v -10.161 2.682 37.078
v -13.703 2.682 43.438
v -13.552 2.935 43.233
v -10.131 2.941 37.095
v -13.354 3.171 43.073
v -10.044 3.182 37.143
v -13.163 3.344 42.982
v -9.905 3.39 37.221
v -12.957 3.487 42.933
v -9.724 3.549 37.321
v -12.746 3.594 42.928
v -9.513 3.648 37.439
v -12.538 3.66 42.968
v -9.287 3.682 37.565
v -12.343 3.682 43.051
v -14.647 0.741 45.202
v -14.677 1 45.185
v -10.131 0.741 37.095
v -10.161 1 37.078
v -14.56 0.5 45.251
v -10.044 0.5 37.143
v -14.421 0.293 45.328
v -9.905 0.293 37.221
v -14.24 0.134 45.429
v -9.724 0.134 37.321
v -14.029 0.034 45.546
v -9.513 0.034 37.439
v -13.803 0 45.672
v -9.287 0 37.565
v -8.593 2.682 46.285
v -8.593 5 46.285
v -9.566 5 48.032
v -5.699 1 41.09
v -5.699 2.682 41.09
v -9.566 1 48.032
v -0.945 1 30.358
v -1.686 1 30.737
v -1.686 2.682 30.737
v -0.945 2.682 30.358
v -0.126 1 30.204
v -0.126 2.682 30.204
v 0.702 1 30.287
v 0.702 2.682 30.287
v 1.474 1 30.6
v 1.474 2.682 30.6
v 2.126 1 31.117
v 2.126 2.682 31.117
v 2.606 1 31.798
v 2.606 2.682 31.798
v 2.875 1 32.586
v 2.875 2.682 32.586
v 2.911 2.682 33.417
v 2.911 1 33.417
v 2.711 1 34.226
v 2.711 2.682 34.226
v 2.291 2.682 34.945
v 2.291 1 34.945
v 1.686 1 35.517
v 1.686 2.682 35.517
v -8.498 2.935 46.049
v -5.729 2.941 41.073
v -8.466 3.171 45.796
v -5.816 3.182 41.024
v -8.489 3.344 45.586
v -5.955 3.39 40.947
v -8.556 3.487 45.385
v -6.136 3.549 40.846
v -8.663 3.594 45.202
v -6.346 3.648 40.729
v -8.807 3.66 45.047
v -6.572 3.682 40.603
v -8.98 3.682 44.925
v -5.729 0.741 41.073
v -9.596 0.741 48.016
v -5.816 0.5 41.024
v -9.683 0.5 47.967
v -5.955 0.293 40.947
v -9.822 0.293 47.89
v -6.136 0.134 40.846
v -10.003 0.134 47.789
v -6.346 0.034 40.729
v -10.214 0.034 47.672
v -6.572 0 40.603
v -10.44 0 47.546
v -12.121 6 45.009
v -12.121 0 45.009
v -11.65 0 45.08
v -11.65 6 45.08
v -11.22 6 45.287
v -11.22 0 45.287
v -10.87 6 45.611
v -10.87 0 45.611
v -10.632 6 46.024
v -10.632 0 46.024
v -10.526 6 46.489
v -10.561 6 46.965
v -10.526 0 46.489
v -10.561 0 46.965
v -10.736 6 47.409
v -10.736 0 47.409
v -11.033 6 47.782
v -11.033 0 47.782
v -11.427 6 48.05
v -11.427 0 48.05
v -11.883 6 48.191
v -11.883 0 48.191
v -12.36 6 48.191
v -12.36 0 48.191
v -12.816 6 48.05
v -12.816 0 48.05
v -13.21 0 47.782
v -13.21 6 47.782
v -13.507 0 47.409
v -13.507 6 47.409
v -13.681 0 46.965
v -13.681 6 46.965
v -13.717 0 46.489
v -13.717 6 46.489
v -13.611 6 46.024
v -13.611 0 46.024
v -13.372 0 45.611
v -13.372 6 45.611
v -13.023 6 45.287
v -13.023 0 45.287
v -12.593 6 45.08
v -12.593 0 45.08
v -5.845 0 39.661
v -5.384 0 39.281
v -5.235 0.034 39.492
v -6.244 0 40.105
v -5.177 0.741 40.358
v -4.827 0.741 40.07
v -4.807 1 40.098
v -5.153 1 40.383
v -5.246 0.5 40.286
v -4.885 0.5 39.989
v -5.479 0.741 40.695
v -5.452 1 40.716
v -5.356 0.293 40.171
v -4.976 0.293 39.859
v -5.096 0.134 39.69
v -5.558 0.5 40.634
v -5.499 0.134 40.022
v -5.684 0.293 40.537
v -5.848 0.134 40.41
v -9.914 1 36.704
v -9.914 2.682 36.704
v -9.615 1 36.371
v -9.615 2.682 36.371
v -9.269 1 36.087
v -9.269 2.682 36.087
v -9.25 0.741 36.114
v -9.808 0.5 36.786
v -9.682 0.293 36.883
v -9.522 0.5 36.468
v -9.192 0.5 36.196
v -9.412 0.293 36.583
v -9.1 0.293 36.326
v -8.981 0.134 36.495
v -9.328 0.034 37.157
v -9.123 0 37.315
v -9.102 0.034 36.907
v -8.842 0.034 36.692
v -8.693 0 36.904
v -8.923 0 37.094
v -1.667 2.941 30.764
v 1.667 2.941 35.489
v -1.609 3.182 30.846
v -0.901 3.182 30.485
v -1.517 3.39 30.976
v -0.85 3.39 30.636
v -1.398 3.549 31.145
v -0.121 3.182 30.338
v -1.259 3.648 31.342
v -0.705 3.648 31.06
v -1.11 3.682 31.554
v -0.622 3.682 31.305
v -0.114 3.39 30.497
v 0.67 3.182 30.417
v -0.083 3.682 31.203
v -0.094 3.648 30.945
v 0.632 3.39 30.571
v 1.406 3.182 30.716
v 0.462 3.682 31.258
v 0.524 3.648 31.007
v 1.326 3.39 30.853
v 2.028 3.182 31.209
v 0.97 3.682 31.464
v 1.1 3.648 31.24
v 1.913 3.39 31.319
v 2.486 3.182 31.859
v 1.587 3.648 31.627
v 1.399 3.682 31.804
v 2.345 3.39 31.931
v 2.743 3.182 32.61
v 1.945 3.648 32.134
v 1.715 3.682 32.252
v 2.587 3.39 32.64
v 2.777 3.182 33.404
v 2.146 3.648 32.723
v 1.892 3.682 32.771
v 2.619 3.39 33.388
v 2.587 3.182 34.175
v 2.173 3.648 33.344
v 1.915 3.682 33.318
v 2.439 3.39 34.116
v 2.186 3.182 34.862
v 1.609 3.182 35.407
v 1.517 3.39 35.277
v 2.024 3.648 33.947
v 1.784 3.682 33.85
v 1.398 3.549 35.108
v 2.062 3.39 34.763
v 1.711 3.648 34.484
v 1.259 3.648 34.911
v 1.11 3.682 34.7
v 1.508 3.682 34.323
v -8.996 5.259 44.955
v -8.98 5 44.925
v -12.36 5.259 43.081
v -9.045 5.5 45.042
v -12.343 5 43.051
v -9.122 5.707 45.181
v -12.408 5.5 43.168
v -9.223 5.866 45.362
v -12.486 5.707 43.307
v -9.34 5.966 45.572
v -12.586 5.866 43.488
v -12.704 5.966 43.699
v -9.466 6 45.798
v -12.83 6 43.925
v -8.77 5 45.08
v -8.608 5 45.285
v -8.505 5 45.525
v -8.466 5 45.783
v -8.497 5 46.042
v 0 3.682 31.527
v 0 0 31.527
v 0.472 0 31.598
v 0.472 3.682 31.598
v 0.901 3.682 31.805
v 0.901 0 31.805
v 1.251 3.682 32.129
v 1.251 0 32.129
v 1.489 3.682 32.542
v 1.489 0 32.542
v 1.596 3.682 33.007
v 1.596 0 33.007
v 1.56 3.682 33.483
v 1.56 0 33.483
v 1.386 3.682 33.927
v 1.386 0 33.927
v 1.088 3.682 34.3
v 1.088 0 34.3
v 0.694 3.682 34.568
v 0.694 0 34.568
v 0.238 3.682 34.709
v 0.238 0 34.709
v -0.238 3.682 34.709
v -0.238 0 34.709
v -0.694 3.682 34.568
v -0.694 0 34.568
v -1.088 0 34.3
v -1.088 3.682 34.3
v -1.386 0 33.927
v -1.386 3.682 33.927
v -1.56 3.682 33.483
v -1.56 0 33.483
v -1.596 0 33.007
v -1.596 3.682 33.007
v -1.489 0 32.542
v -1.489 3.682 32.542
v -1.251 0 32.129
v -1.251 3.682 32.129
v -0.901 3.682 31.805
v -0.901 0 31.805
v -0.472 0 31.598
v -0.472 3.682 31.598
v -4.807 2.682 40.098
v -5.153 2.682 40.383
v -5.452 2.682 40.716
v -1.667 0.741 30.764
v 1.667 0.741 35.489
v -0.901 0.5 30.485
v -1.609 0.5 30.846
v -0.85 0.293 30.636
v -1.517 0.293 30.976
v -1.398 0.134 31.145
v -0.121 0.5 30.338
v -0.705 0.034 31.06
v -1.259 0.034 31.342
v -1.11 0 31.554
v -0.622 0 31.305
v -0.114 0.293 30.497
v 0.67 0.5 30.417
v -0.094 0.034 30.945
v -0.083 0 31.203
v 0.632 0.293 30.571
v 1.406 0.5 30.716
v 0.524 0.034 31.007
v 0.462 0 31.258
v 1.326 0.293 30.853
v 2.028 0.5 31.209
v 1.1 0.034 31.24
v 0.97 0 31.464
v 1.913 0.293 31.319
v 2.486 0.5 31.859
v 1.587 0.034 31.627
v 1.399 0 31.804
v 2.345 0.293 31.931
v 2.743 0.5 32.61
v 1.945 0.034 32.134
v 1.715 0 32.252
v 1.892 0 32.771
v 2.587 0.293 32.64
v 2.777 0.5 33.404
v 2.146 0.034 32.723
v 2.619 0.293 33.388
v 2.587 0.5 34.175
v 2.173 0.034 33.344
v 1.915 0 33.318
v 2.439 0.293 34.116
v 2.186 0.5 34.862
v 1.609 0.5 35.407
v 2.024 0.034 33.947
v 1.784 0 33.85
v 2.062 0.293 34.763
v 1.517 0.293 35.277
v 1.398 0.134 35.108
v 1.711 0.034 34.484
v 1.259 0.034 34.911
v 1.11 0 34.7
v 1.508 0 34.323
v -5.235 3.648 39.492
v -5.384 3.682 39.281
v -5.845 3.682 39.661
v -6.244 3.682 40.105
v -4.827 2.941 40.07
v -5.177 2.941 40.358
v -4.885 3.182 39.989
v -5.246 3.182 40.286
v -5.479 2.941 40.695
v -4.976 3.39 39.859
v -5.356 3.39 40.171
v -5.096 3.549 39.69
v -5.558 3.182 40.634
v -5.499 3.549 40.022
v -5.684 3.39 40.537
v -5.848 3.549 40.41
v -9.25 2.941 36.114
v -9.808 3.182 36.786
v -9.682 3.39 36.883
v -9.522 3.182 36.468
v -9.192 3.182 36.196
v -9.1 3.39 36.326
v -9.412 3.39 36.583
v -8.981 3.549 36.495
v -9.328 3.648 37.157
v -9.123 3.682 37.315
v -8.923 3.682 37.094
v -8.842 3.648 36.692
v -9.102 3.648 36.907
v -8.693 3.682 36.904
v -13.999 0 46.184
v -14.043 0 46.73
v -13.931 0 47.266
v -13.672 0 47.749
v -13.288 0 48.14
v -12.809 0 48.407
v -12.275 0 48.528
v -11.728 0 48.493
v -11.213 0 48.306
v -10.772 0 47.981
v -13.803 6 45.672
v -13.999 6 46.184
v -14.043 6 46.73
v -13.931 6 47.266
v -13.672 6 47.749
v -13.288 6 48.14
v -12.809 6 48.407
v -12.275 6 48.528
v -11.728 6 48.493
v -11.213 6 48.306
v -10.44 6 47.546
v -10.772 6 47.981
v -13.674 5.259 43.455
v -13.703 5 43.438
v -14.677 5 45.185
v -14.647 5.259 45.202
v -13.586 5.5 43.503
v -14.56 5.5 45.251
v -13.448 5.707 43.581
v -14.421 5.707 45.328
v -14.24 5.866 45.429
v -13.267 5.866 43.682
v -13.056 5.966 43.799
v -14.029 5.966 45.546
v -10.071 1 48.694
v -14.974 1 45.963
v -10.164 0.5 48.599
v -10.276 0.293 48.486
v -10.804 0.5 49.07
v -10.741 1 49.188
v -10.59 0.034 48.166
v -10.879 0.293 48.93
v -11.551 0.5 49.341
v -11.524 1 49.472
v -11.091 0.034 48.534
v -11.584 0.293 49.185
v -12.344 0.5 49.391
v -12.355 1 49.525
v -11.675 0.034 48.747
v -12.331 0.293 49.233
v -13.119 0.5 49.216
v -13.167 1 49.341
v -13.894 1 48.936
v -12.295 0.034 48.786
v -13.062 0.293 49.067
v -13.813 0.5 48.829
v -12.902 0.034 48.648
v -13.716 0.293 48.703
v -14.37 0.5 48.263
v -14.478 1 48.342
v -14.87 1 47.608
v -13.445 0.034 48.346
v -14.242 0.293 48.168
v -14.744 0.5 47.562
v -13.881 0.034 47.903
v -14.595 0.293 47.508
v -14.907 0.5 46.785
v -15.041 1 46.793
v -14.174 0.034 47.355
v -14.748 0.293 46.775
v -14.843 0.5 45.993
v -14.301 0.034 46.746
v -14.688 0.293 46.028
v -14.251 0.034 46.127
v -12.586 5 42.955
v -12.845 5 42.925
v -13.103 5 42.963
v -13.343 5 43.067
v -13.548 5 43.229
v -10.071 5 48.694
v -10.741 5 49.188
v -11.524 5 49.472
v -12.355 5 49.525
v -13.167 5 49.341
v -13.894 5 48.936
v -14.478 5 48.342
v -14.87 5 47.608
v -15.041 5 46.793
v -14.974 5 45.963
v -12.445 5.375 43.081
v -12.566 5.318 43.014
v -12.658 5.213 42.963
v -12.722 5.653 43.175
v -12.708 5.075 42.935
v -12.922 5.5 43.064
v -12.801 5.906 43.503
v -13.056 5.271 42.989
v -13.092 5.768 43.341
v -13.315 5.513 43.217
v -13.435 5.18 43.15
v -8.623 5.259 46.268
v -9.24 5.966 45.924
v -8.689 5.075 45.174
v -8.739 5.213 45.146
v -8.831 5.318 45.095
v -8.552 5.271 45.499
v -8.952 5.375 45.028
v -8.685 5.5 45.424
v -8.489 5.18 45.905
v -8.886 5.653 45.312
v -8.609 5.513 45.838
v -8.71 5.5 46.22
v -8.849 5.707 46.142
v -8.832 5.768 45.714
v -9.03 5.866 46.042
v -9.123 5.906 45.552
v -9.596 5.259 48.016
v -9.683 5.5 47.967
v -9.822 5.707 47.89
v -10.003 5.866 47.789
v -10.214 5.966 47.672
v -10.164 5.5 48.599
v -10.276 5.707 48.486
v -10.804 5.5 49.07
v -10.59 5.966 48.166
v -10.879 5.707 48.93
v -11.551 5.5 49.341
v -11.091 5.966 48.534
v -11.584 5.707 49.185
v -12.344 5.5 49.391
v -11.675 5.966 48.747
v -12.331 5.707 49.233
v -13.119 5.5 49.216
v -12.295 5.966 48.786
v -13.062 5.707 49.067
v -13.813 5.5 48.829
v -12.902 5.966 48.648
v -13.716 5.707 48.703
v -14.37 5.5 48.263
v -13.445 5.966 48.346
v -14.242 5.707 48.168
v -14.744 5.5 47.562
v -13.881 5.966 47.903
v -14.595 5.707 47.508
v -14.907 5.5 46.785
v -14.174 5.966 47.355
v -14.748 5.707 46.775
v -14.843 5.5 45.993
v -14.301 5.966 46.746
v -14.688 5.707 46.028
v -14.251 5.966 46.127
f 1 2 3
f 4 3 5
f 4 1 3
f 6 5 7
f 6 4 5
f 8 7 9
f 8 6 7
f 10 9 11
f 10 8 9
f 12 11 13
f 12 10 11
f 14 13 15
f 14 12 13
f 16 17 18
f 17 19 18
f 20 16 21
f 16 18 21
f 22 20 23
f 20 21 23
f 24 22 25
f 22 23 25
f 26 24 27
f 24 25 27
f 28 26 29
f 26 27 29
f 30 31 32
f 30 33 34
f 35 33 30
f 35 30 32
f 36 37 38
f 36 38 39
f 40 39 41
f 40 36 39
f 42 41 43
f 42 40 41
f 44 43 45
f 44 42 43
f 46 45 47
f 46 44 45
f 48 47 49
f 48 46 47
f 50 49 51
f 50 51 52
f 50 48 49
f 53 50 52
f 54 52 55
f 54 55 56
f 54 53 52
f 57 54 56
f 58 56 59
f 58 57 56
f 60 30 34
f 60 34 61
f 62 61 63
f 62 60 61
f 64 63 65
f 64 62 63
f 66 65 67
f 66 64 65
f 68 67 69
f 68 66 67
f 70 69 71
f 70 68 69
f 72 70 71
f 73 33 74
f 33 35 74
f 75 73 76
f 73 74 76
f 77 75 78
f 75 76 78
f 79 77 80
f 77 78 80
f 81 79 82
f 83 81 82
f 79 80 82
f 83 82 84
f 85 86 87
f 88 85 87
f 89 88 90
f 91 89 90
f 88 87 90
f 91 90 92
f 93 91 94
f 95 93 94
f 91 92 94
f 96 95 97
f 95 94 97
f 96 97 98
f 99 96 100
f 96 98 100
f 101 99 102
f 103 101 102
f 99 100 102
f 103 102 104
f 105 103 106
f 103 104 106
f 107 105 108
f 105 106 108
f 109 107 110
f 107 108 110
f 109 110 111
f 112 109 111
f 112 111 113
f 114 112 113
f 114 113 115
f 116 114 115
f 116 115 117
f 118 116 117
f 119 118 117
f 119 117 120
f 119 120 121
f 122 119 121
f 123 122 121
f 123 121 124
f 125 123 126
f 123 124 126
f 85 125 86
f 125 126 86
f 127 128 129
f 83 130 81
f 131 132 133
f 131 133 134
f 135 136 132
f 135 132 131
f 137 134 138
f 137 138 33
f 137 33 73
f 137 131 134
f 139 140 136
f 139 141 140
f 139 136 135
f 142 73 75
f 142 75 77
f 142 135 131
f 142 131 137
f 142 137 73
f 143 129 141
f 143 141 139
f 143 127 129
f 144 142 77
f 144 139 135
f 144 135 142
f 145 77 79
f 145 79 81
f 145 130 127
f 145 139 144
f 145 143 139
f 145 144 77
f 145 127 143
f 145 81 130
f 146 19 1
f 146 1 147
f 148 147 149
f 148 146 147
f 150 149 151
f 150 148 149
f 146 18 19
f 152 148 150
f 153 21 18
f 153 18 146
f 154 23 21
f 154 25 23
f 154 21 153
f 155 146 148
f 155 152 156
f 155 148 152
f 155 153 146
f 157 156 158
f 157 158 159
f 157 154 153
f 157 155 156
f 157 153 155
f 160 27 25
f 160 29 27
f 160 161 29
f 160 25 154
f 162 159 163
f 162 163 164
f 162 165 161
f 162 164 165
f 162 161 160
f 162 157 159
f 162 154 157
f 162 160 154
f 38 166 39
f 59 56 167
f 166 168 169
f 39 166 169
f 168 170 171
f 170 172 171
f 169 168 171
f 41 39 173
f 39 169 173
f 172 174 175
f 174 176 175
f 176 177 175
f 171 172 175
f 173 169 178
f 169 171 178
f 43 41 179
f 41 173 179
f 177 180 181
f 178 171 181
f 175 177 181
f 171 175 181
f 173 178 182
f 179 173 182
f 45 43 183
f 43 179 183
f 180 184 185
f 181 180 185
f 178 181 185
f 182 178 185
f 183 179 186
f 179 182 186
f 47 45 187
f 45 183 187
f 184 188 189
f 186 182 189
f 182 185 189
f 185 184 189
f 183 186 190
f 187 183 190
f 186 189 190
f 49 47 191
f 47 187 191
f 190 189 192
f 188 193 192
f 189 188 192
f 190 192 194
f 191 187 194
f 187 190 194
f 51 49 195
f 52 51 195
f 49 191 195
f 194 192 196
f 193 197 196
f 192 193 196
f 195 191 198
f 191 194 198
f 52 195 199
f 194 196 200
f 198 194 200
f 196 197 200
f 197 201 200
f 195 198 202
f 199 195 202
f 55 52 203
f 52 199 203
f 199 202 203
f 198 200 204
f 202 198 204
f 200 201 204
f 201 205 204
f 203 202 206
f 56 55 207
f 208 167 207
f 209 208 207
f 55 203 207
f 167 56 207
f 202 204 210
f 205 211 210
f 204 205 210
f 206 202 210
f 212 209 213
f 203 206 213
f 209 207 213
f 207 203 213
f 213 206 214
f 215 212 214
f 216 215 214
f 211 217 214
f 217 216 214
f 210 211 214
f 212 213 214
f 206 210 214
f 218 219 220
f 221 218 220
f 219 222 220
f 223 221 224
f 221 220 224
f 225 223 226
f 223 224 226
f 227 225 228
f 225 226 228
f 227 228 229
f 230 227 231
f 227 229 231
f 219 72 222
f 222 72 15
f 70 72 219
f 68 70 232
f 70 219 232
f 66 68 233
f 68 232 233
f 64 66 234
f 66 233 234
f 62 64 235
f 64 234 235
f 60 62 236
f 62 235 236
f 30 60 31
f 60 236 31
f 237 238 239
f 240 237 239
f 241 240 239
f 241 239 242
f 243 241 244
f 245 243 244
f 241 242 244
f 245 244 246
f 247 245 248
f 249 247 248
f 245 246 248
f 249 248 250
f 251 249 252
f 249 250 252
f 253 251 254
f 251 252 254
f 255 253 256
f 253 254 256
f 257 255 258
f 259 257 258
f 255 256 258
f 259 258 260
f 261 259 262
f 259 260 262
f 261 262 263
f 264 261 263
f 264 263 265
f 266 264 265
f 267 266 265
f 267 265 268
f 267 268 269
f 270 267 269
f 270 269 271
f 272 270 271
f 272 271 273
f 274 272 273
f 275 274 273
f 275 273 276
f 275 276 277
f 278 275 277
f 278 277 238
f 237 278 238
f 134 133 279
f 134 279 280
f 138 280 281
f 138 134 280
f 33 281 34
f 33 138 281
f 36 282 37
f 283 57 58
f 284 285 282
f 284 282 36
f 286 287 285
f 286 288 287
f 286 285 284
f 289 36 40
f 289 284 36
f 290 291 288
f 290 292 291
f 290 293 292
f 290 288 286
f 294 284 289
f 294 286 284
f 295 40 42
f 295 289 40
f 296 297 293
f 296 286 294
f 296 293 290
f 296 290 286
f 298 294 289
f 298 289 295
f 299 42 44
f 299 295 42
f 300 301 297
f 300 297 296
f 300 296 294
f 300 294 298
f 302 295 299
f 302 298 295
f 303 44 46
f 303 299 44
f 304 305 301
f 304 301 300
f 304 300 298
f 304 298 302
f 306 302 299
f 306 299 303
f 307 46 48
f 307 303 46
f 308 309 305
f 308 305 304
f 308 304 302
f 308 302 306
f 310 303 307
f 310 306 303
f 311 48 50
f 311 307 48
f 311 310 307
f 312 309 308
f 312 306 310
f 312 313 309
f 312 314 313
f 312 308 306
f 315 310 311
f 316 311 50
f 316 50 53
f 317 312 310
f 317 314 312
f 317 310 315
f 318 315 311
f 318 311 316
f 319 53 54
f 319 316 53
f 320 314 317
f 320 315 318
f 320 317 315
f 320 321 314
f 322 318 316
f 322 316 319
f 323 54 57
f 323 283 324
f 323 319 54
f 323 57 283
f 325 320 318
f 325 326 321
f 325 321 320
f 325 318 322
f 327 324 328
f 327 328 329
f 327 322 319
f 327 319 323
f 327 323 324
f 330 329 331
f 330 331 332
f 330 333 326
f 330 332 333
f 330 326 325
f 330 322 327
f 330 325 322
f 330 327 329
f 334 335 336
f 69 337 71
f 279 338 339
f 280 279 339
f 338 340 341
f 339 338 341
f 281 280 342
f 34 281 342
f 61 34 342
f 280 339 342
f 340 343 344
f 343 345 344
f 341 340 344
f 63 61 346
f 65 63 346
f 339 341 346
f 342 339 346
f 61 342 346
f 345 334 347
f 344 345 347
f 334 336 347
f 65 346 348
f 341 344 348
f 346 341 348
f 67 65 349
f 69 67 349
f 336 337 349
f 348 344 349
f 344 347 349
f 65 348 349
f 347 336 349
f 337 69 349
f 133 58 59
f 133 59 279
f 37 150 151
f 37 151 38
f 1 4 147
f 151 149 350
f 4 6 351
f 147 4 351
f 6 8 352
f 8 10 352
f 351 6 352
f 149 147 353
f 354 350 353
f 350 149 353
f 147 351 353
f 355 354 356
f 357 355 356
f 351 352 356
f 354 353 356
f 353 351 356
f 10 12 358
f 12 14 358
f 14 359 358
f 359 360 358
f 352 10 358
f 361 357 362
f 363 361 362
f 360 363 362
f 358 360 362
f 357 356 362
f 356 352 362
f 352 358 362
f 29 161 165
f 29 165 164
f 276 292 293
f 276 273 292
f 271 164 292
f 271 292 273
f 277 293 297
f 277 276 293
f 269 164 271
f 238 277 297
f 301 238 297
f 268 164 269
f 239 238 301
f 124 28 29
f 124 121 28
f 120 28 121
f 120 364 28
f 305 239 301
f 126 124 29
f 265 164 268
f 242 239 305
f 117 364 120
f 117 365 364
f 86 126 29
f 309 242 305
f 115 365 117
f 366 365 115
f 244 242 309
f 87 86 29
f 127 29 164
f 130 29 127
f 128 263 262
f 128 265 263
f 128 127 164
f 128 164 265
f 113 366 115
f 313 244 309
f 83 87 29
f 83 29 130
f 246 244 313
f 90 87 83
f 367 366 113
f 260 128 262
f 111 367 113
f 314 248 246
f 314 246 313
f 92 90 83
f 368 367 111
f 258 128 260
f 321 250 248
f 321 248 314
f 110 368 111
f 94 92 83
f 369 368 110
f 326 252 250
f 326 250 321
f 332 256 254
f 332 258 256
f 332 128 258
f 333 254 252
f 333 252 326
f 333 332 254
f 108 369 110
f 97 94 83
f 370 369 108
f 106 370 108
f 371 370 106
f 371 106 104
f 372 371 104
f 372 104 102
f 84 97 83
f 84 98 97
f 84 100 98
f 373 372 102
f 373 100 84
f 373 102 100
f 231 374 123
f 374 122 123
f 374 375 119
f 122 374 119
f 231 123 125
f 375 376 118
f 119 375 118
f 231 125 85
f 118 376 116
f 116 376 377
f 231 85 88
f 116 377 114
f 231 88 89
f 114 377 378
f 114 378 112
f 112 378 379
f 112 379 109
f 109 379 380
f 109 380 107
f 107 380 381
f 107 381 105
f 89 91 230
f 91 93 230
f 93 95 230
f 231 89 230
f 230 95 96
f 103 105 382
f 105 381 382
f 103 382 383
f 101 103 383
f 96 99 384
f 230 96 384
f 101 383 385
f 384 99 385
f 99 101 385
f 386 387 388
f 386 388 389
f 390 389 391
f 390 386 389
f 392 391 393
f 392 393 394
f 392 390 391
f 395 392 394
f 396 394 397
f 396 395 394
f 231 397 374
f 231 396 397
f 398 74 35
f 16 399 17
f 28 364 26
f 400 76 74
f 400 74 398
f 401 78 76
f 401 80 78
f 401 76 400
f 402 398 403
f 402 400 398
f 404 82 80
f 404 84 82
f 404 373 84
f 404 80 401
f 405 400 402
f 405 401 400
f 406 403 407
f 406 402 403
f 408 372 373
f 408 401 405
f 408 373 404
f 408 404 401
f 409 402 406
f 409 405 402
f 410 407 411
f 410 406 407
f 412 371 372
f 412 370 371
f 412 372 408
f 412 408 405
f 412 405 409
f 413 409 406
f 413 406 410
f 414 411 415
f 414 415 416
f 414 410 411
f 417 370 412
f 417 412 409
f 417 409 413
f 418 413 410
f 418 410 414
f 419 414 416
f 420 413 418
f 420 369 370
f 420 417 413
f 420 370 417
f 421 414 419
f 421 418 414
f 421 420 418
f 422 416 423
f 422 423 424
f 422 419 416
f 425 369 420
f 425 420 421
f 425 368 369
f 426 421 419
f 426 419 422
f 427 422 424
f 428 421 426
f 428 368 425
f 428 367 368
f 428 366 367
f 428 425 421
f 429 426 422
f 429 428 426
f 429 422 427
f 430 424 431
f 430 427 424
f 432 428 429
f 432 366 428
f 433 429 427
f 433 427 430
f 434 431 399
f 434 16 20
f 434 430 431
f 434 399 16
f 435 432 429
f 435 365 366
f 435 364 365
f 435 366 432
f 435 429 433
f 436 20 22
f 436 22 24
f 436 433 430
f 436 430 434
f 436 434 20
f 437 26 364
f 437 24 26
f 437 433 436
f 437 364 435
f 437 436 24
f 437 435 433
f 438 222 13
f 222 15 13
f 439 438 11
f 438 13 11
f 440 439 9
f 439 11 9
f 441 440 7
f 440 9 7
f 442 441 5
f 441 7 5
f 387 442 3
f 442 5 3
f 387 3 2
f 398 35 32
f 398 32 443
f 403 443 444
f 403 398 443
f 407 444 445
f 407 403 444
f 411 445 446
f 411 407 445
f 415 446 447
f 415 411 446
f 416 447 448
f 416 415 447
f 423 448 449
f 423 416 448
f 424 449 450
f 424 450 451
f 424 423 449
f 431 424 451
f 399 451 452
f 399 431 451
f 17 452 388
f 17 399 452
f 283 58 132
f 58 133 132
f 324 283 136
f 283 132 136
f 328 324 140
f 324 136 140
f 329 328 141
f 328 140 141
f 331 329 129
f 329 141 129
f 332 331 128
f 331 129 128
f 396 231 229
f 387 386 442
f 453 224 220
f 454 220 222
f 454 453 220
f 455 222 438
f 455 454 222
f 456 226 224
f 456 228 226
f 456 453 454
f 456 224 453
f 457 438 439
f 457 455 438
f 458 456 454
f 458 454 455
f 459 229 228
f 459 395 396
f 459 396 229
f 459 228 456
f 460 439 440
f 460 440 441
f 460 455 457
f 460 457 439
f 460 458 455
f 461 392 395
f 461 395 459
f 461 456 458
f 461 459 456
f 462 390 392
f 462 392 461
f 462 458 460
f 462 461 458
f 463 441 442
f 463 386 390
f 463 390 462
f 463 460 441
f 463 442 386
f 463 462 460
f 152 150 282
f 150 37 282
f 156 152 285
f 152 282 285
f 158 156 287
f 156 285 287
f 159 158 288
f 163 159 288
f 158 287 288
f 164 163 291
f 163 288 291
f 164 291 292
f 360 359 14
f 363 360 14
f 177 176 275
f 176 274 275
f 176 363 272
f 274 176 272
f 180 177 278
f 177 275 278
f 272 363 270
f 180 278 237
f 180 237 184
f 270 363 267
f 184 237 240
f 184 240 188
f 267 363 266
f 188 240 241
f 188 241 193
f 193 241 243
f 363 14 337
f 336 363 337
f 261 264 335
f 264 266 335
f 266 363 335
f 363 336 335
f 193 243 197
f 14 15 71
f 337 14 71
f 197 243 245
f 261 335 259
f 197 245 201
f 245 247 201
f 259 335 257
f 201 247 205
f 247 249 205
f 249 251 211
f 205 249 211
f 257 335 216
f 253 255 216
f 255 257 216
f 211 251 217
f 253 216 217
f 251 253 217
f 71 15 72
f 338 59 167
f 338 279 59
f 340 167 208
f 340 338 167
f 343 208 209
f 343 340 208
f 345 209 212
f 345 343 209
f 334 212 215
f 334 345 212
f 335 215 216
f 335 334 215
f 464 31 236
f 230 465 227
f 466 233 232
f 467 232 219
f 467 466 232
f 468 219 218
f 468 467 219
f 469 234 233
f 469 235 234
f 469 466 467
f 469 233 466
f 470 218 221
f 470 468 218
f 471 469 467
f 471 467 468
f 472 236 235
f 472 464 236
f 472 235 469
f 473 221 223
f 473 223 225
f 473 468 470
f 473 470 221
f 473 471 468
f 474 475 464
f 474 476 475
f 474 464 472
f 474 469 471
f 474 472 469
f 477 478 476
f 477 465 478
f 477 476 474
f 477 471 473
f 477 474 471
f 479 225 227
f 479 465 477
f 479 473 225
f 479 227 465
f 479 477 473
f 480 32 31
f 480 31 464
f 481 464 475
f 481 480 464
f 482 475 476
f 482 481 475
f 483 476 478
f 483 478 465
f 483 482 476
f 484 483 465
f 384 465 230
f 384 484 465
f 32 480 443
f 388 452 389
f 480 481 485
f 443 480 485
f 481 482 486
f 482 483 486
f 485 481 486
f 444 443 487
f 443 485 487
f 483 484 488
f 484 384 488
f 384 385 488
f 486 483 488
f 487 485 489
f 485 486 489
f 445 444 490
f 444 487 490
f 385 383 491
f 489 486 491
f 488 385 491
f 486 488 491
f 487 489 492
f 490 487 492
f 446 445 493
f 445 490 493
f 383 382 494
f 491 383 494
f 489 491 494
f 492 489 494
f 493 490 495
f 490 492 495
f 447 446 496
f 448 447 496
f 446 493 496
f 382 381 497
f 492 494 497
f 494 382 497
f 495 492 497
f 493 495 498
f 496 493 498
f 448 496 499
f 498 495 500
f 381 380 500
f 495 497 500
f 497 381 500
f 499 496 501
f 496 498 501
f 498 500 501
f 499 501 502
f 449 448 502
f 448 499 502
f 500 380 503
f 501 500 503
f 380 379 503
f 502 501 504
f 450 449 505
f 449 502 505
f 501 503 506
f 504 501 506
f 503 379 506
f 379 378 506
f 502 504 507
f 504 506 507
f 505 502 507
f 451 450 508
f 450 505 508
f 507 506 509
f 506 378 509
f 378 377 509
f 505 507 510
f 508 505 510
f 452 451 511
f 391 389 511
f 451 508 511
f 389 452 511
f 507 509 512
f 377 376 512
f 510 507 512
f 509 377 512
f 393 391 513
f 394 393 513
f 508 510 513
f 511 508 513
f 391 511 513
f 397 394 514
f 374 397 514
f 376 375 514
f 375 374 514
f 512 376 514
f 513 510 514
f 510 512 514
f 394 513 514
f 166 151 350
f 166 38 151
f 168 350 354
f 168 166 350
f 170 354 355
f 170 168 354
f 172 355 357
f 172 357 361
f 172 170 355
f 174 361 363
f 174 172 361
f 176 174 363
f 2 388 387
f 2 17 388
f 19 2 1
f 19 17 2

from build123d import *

# Parameters (mm, degrees)
SKETCH1_R           = 1.6000000000000019
SKETCH1_R_2         = 1.6
BOSS_EXTRUDE1_DEPTH = 6
FILLET2_R           = 1
CUT_EXTRUDE1_START  = -2.3175
SKETCH3_R           = 1.6
CUT_EXTRUDE1_DEPTH  = 2.3175
FILLET3_R           = 1
FILLET4_R           = 1


with BuildPart() as part:
    # Sketch1 → Boss-Extrude1 (new body)
    with BuildSketch(Plane(origin=(0, 0, 0), x_dir=(1, 0, 0), z_dir=(0, 1, 0))):
        with BuildLine():
            Line((-14.676643190871216, 12.058848545686113), (-10.160612201428068, 3.951430072051938))
            ThreePointArc((-10.160612201428068, 3.951430072051938), (-9.770701137956143, 3.4055643719184734), (-9.26924383935776, 2.9599854477283642))
            Line((-9.26924383935776, 2.9599854477283642), (-1.6862307188325316, -2.390031581980774))
            ThreePointArc((-1.6862307188325316, -2.390031581980774), (2.3900315819807747, -1.6862307188325345), (1.6862307188325354, 2.3900315819807725))
            Line((1.6862307188325354, 2.3900315819807725), (-4.8073944342993835, 6.9714564854625545))
            ThreePointArc((-4.8073944342993835, 6.9714564854625545), (-5.308851732897766, 7.417035409652663), (-5.6987627963696905, 7.962901109786128))
            Line((-5.6987627963696905, 7.962901109786128), (-9.566013447169048, 14.90559469221669))
            ThreePointArc((-9.566013447169048, 14.90559469221669), (-13.54470139228542, 16.037536490802488), (-14.676643190871216, 12.058848545686113))
        make_face()
        with Locations(Location((-12.121328319020131, 13.482221618951401, 0), (0, 0, 270))):
            Circle(SKETCH1_R, mode=Mode.SUBTRACT)
        with Locations(Location((1.73e-15, -8.7e-16, 0), (0, 0, 270))):
            Circle(SKETCH1_R_2, mode=Mode.SUBTRACT)
    extrude(amount=BOSS_EXTRUDE1_DEPTH)

    # Fillet2
    fillet2_edges = [part.edges().sort_by_distance(p)[0] for p in [
        (-12.418627696149642, 0, -8.005139308869026),
        (-13.544701392285422, 0, -16.037536490802488),
        (-7.632388121769369, 0, -11.43424790100141),
        (-5.308851732897767, 0, -7.417035409652664),
        (-13.544701392285422, 6, -16.037536490802488),
        (-12.418627696149642, 6, -8.005139308869026),
        (-9.770701137956143, 6, -3.405564371918474),
        (-5.4777372790951455, 6, -0.28497693287379544),
        (2.390031581980775, 6, 1.686230718832534),
        (-1.5605818577334243, 6, -4.6807440337216635),
        (-5.308851732897767, 6, -7.417035409652664),
        (-1.5605818577334243, 0, -4.6807440337216635),
        (-7.632388121769369, 6, -11.43424790100141),
        (2.390031581980775, 0, 1.686230718832534),
        (-5.4777372790951455, 0, -0.28497693287379544),
        (-9.770701137956143, 0, -3.405564371918474),
    ]]
    fillet(fillet2_edges, radius=FILLET2_R)

    # Sketch3 → Cut-Extrude1 (cut)
    # profile 1 of 2: a face of its own
    with BuildSketch(Plane(origin=(0, 6, 0), x_dir=(1, 0, 0), z_dir=(0, 1, 0)).offset(CUT_EXTRUDE1_START)):
        with BuildLine():
            ThreePointArc((-5.383883568942986, 6.154351671110155), (-6.052493300407496, 6.748456903363634), (-6.572374718370062, 7.476277836874918))
            Line((-6.572374718370061, 7.476277836874918), (-8.97975555043579, 11.79813565330437))
            Line((-8.979755550435788, 11.79813565330437), (-12.343161450137215, 9.924636052596211))
            Line((-12.343161450137217, 9.92463605259621), (-9.287000279427696, 4.438053344963148))
            ThreePointArc((-9.287000279427696, 4.438053344963148), (-9.027059570446415, 4.074142878207507), (-8.692754704714162, 3.7770902620807663))
            Line((-8.692754704714162, 3.7770902620807667), (-1.1097415841889307, -1.5729267676283727))
            ThreePointArc((-1.1097415841889307, -1.5729267676283722), (1.5729267676283736, -1.1097415841889322), (1.1097415841889327, 1.5729267676283718))
            Line((1.1097415841889327, 1.5729267676283716), (-5.383883568942986, 6.154351671110155))
        make_face()
        with Locations(Location((1.73e-15, -8.7e-16, 0), (0, 0, 270))):
            Circle(SKETCH3_R, mode=Mode.SUBTRACT)
    # profile 2 of 2: a face of its own
    with BuildSketch(Plane(origin=(0, 6, 0), x_dir=(1, 0, 0), z_dir=(0, 1, 0)).offset(CUT_EXTRUDE1_START)):
        with BuildLine():
            Line((-8.97975555043579, 11.79813565330437), (-6.572374718370061, 7.476277836874918))
            ThreePointArc((-6.572374718370062, 7.476277836874918), (-6.052493300407496, 6.748456903363634), (-5.383883568942986, 6.154351671110155))
            Line((-5.383883568942986, 6.154351671110155), (1.1097415841889327, 1.5729267676283716))
            ThreePointArc((1.1097415841889327, 1.5729267676283718), (1.5729267676283736, -1.1097415841889322), (-1.1097415841889307, -1.5729267676283722))
            Line((-1.1097415841889307, -1.5729267676283727), (-8.692754704714162, 3.7770902620807667))
            ThreePointArc((-8.692754704714162, 3.7770902620807663), (-9.027059570446415, 4.074142878207507), (-9.287000279427696, 4.438053344963148))
            Line((-9.287000279427696, 4.438053344963148), (-12.343161450137217, 9.92463605259621))
            Line((-12.343161450137215, 9.924636052596211), (-13.216773372137586, 9.438012779685))
            Line((-13.216773372137586, 9.438012779685), (-10.160612201428068, 3.951430072051938))
            ThreePointArc((-10.160612201428068, 3.951430072051938), (-9.770701137956145, 3.4055643719184743), (-9.269243839357761, 2.959985447728366))
            Line((-9.269243839357761, 2.9599854477283656), (-1.6862307188325316, -2.390031581980774))
            ThreePointArc((-1.6862307188325316, -2.390031581980774), (2.3900315819807743, -1.686230718832534), (1.686230718832535, 2.390031581980772))
            Line((1.686230718832534, 2.3900315819807725), (-4.8073944342993835, 6.9714564854625545))
            ThreePointArc((-4.807394434299383, 6.971456485462554), (-5.308851732897767, 7.417035409652663), (-5.6987627963696905, 7.962901109786128))
            Line((-5.6987627963696905, 7.962901109786128), (-8.10614362843542, 12.284758926215579))
            Line((-8.10614362843542, 12.284758926215579), (-8.979755550435788, 11.79813565330437))
        make_face()
    extrude(amount=CUT_EXTRUDE1_DEPTH, mode=Mode.SUBTRACT)

    # Fillet3
    fillet3_edges = [part.edges().sort_by_distance(p)[0] for p in [
        (-6.9024532124025555, 3.6825, -10.123830018000854),
        (-5.308851732897768, 3.6825, -7.417035409652662),
        (-1.5605818577334247, 3.6825, -4.6807440337216635),
        (-5.477737279095146, 3.6825, -0.2849769328737959),
        (-11.688692786782827, 3.6825, -6.694721425868469),
        (-9.770701137956145, 3.6825, -3.405564371918474),
        (2.390031581980774, 3.6825, 1.6862307188325336),
    ]]
    fillet(fillet3_edges, radius=FILLET3_R)

    # Fillet4
    fillet4_edges = [part.edges().sort_by_distance(p)[0] for p in [
        (-12.96089836430909, 5.707106781186548, -9.580541436437505),
        (-10.661458500286502, 6, -10.86138585295029),
        (-8.362018636263915, 5.707106781186548, -12.142230269463079),
        (-13.216773372137585, 3.84125, -9.438012779685),
        (-8.106143628435422, 3.84125, -12.28475892621558),
    ]]
    fillet(fillet4_edges, radius=FILLET4_R)


with BuildPart() as body_2:
    # Mirror12: mirrored copy
    add(part.part.mirror(Plane.XY.offset(16.56331838768985)))


solid = body_2.part
